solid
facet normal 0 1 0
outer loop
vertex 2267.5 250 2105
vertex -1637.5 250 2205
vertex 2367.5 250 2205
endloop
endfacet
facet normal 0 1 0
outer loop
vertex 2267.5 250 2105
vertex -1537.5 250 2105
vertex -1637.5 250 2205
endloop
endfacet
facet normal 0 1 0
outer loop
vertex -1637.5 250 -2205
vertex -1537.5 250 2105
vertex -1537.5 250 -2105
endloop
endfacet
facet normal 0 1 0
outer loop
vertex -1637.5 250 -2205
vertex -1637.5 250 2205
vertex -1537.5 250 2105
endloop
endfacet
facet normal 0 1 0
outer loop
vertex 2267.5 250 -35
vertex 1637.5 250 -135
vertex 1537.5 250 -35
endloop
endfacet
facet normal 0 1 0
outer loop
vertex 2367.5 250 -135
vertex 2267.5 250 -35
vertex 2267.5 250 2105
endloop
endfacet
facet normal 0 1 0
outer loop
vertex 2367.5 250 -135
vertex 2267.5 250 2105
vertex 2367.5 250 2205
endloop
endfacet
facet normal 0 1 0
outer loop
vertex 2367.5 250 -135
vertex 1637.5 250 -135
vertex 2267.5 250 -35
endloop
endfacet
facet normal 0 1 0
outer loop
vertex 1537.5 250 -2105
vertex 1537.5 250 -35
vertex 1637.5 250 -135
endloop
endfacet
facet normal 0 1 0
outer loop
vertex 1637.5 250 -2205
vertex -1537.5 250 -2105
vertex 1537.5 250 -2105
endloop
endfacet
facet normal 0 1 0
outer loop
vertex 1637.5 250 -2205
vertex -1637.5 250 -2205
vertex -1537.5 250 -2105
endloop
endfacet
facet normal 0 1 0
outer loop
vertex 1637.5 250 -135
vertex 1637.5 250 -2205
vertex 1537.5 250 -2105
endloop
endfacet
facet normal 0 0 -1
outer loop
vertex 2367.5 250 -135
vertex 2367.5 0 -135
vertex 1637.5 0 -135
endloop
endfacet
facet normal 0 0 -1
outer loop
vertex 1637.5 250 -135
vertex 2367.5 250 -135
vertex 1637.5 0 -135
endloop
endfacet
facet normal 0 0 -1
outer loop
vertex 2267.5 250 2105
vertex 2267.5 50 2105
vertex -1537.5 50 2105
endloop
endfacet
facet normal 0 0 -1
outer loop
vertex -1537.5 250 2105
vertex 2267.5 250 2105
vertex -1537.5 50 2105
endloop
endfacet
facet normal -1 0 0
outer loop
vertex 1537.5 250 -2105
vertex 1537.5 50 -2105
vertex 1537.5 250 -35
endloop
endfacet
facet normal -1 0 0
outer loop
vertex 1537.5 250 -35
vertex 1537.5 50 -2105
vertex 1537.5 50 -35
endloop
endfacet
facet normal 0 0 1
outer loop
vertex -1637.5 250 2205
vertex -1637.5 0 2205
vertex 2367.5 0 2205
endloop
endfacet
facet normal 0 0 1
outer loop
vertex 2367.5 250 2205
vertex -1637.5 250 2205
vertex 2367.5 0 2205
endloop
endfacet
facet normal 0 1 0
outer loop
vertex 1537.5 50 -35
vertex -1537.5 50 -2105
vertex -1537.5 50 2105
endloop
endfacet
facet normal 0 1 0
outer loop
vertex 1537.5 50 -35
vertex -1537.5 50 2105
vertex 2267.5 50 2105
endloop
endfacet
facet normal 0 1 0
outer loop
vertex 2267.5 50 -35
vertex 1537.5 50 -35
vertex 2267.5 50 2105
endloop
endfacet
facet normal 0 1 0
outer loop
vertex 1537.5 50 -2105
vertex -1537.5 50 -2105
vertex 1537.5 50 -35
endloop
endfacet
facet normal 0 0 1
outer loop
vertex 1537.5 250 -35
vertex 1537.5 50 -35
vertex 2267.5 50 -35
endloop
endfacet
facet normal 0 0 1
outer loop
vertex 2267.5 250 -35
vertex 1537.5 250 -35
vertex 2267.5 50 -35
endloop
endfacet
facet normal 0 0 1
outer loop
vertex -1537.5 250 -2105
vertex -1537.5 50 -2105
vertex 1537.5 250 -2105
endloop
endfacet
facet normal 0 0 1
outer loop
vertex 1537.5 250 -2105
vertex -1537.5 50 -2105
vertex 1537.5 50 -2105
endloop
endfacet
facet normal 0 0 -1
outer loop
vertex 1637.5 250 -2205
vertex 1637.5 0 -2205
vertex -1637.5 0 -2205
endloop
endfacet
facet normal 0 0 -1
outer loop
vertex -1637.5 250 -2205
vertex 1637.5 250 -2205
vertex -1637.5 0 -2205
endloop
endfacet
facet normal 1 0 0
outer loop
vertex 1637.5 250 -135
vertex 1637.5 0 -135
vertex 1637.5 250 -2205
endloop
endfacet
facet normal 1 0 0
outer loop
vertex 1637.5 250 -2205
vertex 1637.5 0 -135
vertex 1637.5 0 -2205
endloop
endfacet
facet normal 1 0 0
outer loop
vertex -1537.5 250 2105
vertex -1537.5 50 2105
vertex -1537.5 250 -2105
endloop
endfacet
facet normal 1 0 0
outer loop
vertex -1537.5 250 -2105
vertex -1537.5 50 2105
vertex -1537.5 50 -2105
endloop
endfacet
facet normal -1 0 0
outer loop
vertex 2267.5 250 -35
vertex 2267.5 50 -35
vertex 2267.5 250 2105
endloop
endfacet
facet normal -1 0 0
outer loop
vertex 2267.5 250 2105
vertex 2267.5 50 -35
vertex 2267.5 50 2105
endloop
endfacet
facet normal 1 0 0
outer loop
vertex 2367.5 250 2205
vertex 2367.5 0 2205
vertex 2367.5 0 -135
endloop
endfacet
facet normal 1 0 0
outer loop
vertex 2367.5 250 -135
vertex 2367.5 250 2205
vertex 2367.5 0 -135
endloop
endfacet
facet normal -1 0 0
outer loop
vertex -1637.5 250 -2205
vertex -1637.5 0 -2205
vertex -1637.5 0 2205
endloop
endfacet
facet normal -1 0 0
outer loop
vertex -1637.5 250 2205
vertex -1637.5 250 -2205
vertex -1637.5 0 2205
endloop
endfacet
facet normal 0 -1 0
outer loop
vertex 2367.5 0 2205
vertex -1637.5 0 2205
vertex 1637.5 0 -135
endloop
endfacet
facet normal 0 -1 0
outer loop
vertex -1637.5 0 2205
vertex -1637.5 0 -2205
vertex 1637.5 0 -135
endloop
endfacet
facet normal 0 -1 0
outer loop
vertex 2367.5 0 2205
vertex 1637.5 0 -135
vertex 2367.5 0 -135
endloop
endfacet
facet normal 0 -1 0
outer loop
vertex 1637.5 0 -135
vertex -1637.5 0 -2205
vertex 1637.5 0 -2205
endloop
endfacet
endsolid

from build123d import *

# Parameters (mm, degrees)
BOSS_EXTRUDE3_DEPTH = 50
BOSS_EXTRUDE4_DEPTH = 250


with BuildPart() as part:
    # Sketch2 → Boss-Extrude3 (new body)
    with BuildSketch(Plane(origin=(0, 0, 0), x_dir=(1, 0, 0), z_dir=(0, 1, 0))):
        Polygon((-1637.5, 2105), (-1637.5, -2105), (-1637.5, -2205), (2267.5, -2205), (2367.5, -2205), (2367.5, 135), (2267.5, 135), (1637.5, 135), (1637.5, 2205), (1537.5, 2205), (-1637.5, 2205), align=None)
    extrude(amount=BOSS_EXTRUDE3_DEPTH)

    # Sketch2<6> → Boss-Extrude4 (add)
    with BuildSketch(Plane(origin=(0, 0, 0), x_dir=(1, 0, 0), z_dir=(0, 1, 0))):
        Polygon((2367.5, 135), (2267.5, 135), (1637.5, 135), (1637.5, 2205), (1537.5, 2205), (-1637.5, 2205), (-1637.5, 2105), (-1637.5, -2105), (-1637.5, -2205), (2267.5, -2205), (2367.5, -2205), align=None)
        Polygon((1537.5, -2105), (-1537.5, -2105), (-1537.5, 2105), (1537.5, 2105), (1537.5, 135), (1537.5, 35), (1637.5, 35), (2267.5, 35), (2267.5, -2105), align=None, mode=Mode.SUBTRACT)
    extrude(amount=BOSS_EXTRUDE4_DEPTH)


solid = part.part
